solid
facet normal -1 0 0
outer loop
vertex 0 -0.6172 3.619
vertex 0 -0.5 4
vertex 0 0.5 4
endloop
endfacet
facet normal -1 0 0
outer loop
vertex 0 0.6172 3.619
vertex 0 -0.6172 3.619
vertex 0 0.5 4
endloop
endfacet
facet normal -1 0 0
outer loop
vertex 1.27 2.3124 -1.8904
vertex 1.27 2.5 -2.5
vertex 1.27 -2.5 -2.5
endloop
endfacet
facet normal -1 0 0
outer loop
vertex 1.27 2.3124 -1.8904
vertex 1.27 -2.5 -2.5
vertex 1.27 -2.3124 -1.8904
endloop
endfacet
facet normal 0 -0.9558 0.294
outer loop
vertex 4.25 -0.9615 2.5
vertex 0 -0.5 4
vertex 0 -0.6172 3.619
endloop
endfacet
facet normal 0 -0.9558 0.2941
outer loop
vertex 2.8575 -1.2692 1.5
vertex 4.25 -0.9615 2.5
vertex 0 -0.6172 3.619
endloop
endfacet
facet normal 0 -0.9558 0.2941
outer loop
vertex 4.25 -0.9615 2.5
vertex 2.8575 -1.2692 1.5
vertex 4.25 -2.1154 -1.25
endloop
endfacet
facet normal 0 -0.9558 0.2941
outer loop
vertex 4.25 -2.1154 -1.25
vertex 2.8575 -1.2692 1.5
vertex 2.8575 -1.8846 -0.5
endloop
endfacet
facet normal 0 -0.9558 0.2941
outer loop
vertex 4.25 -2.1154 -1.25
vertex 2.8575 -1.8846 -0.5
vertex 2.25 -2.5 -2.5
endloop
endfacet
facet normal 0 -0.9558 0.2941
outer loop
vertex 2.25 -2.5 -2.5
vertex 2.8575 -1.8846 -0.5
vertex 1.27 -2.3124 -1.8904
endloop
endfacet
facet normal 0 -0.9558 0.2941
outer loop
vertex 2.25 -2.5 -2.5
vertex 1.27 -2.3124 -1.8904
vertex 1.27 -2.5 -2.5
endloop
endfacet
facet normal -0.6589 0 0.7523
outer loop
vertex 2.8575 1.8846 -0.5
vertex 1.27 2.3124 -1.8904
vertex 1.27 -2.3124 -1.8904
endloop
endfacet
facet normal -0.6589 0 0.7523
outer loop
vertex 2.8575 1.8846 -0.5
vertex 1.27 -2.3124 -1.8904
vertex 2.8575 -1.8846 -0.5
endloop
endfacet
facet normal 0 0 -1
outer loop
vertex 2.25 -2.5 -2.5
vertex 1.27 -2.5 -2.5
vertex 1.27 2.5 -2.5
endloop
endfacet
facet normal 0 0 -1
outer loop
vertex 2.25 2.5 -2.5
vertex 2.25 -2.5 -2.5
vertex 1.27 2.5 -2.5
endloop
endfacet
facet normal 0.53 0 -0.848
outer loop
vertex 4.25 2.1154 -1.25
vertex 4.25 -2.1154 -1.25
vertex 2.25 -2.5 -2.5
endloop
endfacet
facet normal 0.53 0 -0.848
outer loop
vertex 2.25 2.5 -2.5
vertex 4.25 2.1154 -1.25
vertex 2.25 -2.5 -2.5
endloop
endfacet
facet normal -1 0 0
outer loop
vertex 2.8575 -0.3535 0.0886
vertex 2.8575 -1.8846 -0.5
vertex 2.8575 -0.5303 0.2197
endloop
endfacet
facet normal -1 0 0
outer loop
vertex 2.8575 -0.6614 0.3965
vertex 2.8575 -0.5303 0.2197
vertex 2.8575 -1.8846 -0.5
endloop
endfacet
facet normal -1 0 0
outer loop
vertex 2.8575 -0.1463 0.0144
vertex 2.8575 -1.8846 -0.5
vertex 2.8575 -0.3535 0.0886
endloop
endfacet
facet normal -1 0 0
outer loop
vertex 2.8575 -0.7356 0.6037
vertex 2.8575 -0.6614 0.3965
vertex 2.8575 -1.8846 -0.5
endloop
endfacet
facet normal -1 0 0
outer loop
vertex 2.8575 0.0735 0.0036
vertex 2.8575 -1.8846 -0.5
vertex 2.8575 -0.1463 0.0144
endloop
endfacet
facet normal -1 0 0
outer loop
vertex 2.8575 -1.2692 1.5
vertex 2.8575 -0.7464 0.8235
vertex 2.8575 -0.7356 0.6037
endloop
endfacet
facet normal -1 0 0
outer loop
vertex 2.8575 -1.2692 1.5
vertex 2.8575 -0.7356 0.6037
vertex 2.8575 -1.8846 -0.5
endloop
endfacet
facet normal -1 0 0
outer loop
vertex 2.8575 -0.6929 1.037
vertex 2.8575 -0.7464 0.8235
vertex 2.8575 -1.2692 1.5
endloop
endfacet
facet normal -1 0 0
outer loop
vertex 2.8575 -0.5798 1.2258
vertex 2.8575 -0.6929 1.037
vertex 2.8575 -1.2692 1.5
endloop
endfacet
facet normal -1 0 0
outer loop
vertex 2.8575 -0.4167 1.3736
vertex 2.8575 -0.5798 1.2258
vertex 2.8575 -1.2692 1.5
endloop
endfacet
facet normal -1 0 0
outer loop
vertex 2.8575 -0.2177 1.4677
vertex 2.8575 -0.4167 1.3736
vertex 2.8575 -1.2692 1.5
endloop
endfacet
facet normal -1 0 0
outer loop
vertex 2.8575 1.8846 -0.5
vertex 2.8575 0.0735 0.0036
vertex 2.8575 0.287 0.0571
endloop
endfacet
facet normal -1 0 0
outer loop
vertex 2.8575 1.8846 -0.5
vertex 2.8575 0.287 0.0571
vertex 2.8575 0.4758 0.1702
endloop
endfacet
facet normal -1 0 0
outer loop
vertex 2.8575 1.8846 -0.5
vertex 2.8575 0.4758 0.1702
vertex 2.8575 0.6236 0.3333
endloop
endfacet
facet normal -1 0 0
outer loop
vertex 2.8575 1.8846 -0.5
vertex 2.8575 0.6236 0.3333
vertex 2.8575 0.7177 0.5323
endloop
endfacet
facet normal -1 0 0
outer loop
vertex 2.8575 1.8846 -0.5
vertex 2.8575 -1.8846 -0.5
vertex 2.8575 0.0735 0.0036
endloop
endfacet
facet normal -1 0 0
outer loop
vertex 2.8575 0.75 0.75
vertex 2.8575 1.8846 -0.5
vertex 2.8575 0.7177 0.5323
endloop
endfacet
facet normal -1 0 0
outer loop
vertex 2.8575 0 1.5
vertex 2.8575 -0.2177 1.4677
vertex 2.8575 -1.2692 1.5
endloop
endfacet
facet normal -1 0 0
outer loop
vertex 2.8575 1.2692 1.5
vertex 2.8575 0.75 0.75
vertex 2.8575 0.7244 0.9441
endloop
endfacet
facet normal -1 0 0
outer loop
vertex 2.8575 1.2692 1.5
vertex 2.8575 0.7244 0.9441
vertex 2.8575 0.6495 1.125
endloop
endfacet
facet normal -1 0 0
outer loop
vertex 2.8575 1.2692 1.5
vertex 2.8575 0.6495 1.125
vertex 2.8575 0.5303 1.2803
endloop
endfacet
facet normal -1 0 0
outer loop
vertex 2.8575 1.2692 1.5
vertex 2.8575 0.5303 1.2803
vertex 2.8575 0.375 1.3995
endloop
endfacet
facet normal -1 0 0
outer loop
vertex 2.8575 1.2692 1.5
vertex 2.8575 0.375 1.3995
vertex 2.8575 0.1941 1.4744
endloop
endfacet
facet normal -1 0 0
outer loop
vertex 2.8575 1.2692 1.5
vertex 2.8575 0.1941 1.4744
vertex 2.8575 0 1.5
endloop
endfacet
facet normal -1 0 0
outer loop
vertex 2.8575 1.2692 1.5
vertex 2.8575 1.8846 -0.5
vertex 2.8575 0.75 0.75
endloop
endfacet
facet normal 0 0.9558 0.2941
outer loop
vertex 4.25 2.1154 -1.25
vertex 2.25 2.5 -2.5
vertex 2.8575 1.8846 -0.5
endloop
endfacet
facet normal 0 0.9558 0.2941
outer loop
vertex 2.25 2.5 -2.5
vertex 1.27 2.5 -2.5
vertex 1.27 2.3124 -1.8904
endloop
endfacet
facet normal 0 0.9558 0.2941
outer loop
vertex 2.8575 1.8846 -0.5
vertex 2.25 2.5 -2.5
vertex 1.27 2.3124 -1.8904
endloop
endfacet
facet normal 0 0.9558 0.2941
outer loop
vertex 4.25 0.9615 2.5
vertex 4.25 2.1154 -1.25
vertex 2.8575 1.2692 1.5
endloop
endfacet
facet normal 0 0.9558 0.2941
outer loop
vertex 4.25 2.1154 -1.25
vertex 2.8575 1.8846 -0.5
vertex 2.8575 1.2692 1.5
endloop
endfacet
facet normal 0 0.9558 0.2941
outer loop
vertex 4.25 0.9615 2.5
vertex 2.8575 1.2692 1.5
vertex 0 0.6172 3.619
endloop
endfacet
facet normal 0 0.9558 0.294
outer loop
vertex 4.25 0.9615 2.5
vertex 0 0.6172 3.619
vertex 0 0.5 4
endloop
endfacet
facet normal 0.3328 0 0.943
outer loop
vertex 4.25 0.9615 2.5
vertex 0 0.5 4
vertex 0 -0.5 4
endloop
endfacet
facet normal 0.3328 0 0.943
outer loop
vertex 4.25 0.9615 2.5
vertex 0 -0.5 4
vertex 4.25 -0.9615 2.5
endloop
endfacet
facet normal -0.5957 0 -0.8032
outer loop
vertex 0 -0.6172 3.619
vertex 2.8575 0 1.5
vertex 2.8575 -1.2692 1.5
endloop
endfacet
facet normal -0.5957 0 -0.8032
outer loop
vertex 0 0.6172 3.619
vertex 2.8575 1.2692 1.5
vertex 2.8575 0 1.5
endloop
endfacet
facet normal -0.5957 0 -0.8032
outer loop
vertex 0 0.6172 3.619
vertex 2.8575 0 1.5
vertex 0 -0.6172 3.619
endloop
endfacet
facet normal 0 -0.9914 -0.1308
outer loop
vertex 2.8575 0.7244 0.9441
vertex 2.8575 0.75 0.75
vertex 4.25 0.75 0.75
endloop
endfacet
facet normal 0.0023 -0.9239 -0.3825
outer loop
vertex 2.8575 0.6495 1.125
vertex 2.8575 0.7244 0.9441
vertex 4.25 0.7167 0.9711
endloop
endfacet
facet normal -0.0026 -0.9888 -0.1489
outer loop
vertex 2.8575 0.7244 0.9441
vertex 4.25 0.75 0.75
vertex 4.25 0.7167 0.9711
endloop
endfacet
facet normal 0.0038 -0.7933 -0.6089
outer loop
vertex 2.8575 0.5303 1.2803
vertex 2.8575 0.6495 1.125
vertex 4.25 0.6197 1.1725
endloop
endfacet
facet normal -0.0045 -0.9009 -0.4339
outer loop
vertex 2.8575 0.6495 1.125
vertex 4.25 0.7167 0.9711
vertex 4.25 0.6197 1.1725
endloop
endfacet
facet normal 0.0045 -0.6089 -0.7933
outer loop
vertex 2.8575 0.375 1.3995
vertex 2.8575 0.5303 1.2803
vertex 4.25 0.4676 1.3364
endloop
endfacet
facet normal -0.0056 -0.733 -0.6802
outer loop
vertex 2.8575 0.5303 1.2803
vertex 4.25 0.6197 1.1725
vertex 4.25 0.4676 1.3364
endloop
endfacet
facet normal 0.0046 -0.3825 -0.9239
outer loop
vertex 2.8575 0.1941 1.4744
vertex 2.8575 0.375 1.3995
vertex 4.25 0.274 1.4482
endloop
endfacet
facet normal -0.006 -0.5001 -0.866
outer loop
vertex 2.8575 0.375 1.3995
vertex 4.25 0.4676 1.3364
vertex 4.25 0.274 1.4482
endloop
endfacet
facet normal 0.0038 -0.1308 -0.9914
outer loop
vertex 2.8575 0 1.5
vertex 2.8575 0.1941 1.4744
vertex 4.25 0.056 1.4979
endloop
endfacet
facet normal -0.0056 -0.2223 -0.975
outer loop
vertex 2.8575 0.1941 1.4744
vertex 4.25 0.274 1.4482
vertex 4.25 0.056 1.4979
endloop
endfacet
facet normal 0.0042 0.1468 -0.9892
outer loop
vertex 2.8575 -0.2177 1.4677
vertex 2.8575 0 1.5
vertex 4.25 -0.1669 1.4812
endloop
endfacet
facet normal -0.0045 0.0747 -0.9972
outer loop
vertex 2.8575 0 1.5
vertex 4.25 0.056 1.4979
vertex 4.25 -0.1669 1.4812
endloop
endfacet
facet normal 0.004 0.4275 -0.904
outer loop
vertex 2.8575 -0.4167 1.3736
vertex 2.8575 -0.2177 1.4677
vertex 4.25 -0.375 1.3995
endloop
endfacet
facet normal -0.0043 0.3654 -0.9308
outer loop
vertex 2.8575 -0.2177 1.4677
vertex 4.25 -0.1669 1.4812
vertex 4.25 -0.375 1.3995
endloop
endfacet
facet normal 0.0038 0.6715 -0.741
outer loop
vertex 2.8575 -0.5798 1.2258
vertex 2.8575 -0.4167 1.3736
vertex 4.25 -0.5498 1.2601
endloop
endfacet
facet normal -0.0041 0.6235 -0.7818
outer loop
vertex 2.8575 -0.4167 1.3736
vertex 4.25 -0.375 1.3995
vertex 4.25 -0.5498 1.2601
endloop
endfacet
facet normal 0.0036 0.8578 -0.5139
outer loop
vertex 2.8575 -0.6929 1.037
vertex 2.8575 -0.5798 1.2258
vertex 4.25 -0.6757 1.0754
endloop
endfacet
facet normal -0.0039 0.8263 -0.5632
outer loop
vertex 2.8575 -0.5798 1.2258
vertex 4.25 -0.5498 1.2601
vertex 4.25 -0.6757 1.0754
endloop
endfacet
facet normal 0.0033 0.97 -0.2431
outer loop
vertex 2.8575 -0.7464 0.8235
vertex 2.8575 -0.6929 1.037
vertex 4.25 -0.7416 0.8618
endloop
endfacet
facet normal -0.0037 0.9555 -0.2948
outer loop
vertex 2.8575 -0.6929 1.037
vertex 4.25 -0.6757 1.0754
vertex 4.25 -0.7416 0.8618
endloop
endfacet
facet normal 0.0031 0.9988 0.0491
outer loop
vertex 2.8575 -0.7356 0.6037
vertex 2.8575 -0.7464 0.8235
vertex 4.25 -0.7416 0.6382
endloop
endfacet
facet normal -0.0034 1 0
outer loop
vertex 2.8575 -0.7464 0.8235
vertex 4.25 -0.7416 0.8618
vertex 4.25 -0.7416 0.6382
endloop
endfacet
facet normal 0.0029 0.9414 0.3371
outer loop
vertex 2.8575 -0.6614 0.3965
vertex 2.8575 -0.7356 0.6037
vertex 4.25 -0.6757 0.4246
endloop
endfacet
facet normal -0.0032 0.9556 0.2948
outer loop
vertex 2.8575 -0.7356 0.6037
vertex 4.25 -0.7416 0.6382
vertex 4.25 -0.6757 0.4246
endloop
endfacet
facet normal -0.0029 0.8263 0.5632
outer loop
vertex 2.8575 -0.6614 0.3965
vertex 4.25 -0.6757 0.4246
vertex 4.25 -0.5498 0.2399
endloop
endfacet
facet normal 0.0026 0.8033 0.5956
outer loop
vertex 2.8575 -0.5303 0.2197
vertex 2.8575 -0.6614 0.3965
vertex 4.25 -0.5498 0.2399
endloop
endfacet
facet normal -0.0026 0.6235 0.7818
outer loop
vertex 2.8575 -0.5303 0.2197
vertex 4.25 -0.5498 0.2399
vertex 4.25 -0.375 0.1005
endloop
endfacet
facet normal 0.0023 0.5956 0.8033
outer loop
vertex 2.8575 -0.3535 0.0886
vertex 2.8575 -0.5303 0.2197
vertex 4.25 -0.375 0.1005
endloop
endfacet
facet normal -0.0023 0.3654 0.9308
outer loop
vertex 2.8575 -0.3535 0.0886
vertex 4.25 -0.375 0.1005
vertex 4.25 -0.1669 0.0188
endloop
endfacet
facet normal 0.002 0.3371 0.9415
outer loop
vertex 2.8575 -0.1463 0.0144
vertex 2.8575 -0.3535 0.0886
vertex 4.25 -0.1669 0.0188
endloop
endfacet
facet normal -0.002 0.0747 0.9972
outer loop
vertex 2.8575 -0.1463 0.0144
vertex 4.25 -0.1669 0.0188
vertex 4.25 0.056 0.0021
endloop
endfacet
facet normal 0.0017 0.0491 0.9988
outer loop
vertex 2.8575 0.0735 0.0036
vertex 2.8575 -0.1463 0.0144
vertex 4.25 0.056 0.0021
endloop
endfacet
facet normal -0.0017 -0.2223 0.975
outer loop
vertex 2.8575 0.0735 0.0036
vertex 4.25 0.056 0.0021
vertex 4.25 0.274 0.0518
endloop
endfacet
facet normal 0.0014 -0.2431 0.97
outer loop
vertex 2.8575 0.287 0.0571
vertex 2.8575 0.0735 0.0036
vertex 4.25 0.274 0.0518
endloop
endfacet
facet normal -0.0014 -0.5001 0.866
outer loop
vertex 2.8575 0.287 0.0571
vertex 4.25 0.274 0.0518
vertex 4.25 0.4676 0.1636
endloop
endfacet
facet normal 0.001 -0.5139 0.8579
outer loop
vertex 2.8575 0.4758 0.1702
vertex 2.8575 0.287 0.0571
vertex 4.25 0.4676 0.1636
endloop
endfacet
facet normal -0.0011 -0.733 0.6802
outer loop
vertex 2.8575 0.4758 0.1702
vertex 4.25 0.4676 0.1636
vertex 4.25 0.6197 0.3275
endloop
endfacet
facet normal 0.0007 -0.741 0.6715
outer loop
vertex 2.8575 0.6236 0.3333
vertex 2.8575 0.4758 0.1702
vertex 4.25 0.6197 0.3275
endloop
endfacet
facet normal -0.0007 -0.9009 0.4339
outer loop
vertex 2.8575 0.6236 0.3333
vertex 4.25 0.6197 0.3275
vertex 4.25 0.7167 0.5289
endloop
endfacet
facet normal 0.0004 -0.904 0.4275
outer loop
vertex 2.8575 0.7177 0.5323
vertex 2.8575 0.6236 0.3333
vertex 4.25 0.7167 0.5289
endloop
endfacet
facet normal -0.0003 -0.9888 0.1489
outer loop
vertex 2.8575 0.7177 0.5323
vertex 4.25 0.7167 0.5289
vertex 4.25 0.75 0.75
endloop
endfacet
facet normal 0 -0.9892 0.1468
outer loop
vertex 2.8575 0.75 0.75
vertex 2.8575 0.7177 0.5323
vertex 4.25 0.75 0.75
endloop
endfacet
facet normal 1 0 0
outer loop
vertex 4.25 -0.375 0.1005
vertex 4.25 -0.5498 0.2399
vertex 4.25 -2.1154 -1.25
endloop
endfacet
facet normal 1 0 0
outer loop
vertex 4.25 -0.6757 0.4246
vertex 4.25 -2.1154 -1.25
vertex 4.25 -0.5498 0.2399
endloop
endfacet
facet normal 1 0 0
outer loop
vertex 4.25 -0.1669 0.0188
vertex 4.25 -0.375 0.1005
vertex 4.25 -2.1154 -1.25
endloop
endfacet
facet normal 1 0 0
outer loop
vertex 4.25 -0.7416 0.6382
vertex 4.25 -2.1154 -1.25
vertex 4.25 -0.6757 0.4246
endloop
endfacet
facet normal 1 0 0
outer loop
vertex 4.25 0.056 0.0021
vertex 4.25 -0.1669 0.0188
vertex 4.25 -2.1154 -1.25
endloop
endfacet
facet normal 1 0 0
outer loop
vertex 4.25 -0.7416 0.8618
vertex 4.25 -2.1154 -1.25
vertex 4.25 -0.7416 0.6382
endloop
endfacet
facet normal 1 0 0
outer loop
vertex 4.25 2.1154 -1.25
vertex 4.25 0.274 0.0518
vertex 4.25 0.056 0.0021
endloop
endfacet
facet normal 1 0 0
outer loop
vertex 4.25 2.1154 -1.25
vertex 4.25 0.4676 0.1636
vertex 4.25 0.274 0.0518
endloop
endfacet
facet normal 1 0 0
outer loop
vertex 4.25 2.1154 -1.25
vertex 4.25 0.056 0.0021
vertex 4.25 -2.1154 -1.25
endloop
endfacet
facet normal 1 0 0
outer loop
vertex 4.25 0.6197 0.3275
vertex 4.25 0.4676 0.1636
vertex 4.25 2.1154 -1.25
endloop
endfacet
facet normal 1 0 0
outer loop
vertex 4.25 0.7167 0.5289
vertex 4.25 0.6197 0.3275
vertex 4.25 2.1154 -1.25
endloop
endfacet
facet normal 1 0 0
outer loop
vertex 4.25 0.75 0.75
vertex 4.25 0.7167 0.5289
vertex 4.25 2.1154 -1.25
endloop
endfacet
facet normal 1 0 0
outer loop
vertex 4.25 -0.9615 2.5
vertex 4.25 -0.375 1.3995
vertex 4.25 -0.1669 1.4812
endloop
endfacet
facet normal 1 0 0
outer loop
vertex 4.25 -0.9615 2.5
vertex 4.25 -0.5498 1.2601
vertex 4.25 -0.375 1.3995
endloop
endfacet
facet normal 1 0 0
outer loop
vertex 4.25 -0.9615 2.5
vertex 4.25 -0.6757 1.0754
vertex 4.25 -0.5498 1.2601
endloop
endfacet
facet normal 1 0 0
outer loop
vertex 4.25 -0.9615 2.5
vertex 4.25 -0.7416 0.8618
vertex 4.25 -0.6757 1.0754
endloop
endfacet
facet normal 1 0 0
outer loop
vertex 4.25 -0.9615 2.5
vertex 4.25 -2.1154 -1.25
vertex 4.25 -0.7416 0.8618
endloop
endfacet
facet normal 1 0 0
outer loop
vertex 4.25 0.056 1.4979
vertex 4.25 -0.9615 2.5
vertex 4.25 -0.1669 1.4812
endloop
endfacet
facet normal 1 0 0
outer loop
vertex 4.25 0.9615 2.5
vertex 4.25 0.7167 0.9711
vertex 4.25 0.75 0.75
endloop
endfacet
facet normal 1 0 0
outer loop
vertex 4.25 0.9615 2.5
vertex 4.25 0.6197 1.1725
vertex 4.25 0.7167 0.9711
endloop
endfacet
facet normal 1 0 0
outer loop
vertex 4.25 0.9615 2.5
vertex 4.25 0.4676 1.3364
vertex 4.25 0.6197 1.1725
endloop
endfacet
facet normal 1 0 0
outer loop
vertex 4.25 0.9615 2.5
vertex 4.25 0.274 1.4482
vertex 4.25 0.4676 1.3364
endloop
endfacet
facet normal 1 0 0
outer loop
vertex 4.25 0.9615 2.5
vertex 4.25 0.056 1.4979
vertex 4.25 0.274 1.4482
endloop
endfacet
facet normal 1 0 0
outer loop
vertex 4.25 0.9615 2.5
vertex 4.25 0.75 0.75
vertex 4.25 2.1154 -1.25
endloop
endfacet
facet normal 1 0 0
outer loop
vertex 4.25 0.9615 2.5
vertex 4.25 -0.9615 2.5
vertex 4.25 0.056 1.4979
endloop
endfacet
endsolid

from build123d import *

# Parameters (mm, degrees)
F1_DEPTH = 4.25
F2_R     = 0.75
F3_DEPTH = 4.251
F5_DEPTH = 12.7


with BuildPart() as f1:
    # F0 (on Right) → F1 (new body)
    with BuildSketch(Plane.YZ):
        Polygon((0.5, 4), (-0.5, 4), (-2.5, -2.5), (2.5, -2.5), align=None)
    extrude(amount=F1_DEPTH)

    # F2 (on face) → F3 (cut, through all)
    with BuildSketch(Plane.YZ.offset(4.25)):
        with Locations((0, 0.75)):
            Circle(F2_R)
    extrude(amount=-F3_DEPTH, mode=Mode.SUBTRACT)

    # F4 (on Front) → F5 (cut, symmetric)
    with BuildSketch(Plane.XZ):
        Polygon((2.8575, 1.5), (0, 3.619), (0, -2.5), (1.27, -2.5), (1.27, -1.8904), (2.8575, -0.5), align=None)
        Polygon((4.25, 2.5), (4.25, 4), (0, 4), align=None)
        Polygon((2.25, -2.5), (4.25, -2.5), (4.25, -1.25), align=None)
    extrude(amount=F5_DEPTH, both=True, mode=Mode.SUBTRACT)


solid = f1.part
